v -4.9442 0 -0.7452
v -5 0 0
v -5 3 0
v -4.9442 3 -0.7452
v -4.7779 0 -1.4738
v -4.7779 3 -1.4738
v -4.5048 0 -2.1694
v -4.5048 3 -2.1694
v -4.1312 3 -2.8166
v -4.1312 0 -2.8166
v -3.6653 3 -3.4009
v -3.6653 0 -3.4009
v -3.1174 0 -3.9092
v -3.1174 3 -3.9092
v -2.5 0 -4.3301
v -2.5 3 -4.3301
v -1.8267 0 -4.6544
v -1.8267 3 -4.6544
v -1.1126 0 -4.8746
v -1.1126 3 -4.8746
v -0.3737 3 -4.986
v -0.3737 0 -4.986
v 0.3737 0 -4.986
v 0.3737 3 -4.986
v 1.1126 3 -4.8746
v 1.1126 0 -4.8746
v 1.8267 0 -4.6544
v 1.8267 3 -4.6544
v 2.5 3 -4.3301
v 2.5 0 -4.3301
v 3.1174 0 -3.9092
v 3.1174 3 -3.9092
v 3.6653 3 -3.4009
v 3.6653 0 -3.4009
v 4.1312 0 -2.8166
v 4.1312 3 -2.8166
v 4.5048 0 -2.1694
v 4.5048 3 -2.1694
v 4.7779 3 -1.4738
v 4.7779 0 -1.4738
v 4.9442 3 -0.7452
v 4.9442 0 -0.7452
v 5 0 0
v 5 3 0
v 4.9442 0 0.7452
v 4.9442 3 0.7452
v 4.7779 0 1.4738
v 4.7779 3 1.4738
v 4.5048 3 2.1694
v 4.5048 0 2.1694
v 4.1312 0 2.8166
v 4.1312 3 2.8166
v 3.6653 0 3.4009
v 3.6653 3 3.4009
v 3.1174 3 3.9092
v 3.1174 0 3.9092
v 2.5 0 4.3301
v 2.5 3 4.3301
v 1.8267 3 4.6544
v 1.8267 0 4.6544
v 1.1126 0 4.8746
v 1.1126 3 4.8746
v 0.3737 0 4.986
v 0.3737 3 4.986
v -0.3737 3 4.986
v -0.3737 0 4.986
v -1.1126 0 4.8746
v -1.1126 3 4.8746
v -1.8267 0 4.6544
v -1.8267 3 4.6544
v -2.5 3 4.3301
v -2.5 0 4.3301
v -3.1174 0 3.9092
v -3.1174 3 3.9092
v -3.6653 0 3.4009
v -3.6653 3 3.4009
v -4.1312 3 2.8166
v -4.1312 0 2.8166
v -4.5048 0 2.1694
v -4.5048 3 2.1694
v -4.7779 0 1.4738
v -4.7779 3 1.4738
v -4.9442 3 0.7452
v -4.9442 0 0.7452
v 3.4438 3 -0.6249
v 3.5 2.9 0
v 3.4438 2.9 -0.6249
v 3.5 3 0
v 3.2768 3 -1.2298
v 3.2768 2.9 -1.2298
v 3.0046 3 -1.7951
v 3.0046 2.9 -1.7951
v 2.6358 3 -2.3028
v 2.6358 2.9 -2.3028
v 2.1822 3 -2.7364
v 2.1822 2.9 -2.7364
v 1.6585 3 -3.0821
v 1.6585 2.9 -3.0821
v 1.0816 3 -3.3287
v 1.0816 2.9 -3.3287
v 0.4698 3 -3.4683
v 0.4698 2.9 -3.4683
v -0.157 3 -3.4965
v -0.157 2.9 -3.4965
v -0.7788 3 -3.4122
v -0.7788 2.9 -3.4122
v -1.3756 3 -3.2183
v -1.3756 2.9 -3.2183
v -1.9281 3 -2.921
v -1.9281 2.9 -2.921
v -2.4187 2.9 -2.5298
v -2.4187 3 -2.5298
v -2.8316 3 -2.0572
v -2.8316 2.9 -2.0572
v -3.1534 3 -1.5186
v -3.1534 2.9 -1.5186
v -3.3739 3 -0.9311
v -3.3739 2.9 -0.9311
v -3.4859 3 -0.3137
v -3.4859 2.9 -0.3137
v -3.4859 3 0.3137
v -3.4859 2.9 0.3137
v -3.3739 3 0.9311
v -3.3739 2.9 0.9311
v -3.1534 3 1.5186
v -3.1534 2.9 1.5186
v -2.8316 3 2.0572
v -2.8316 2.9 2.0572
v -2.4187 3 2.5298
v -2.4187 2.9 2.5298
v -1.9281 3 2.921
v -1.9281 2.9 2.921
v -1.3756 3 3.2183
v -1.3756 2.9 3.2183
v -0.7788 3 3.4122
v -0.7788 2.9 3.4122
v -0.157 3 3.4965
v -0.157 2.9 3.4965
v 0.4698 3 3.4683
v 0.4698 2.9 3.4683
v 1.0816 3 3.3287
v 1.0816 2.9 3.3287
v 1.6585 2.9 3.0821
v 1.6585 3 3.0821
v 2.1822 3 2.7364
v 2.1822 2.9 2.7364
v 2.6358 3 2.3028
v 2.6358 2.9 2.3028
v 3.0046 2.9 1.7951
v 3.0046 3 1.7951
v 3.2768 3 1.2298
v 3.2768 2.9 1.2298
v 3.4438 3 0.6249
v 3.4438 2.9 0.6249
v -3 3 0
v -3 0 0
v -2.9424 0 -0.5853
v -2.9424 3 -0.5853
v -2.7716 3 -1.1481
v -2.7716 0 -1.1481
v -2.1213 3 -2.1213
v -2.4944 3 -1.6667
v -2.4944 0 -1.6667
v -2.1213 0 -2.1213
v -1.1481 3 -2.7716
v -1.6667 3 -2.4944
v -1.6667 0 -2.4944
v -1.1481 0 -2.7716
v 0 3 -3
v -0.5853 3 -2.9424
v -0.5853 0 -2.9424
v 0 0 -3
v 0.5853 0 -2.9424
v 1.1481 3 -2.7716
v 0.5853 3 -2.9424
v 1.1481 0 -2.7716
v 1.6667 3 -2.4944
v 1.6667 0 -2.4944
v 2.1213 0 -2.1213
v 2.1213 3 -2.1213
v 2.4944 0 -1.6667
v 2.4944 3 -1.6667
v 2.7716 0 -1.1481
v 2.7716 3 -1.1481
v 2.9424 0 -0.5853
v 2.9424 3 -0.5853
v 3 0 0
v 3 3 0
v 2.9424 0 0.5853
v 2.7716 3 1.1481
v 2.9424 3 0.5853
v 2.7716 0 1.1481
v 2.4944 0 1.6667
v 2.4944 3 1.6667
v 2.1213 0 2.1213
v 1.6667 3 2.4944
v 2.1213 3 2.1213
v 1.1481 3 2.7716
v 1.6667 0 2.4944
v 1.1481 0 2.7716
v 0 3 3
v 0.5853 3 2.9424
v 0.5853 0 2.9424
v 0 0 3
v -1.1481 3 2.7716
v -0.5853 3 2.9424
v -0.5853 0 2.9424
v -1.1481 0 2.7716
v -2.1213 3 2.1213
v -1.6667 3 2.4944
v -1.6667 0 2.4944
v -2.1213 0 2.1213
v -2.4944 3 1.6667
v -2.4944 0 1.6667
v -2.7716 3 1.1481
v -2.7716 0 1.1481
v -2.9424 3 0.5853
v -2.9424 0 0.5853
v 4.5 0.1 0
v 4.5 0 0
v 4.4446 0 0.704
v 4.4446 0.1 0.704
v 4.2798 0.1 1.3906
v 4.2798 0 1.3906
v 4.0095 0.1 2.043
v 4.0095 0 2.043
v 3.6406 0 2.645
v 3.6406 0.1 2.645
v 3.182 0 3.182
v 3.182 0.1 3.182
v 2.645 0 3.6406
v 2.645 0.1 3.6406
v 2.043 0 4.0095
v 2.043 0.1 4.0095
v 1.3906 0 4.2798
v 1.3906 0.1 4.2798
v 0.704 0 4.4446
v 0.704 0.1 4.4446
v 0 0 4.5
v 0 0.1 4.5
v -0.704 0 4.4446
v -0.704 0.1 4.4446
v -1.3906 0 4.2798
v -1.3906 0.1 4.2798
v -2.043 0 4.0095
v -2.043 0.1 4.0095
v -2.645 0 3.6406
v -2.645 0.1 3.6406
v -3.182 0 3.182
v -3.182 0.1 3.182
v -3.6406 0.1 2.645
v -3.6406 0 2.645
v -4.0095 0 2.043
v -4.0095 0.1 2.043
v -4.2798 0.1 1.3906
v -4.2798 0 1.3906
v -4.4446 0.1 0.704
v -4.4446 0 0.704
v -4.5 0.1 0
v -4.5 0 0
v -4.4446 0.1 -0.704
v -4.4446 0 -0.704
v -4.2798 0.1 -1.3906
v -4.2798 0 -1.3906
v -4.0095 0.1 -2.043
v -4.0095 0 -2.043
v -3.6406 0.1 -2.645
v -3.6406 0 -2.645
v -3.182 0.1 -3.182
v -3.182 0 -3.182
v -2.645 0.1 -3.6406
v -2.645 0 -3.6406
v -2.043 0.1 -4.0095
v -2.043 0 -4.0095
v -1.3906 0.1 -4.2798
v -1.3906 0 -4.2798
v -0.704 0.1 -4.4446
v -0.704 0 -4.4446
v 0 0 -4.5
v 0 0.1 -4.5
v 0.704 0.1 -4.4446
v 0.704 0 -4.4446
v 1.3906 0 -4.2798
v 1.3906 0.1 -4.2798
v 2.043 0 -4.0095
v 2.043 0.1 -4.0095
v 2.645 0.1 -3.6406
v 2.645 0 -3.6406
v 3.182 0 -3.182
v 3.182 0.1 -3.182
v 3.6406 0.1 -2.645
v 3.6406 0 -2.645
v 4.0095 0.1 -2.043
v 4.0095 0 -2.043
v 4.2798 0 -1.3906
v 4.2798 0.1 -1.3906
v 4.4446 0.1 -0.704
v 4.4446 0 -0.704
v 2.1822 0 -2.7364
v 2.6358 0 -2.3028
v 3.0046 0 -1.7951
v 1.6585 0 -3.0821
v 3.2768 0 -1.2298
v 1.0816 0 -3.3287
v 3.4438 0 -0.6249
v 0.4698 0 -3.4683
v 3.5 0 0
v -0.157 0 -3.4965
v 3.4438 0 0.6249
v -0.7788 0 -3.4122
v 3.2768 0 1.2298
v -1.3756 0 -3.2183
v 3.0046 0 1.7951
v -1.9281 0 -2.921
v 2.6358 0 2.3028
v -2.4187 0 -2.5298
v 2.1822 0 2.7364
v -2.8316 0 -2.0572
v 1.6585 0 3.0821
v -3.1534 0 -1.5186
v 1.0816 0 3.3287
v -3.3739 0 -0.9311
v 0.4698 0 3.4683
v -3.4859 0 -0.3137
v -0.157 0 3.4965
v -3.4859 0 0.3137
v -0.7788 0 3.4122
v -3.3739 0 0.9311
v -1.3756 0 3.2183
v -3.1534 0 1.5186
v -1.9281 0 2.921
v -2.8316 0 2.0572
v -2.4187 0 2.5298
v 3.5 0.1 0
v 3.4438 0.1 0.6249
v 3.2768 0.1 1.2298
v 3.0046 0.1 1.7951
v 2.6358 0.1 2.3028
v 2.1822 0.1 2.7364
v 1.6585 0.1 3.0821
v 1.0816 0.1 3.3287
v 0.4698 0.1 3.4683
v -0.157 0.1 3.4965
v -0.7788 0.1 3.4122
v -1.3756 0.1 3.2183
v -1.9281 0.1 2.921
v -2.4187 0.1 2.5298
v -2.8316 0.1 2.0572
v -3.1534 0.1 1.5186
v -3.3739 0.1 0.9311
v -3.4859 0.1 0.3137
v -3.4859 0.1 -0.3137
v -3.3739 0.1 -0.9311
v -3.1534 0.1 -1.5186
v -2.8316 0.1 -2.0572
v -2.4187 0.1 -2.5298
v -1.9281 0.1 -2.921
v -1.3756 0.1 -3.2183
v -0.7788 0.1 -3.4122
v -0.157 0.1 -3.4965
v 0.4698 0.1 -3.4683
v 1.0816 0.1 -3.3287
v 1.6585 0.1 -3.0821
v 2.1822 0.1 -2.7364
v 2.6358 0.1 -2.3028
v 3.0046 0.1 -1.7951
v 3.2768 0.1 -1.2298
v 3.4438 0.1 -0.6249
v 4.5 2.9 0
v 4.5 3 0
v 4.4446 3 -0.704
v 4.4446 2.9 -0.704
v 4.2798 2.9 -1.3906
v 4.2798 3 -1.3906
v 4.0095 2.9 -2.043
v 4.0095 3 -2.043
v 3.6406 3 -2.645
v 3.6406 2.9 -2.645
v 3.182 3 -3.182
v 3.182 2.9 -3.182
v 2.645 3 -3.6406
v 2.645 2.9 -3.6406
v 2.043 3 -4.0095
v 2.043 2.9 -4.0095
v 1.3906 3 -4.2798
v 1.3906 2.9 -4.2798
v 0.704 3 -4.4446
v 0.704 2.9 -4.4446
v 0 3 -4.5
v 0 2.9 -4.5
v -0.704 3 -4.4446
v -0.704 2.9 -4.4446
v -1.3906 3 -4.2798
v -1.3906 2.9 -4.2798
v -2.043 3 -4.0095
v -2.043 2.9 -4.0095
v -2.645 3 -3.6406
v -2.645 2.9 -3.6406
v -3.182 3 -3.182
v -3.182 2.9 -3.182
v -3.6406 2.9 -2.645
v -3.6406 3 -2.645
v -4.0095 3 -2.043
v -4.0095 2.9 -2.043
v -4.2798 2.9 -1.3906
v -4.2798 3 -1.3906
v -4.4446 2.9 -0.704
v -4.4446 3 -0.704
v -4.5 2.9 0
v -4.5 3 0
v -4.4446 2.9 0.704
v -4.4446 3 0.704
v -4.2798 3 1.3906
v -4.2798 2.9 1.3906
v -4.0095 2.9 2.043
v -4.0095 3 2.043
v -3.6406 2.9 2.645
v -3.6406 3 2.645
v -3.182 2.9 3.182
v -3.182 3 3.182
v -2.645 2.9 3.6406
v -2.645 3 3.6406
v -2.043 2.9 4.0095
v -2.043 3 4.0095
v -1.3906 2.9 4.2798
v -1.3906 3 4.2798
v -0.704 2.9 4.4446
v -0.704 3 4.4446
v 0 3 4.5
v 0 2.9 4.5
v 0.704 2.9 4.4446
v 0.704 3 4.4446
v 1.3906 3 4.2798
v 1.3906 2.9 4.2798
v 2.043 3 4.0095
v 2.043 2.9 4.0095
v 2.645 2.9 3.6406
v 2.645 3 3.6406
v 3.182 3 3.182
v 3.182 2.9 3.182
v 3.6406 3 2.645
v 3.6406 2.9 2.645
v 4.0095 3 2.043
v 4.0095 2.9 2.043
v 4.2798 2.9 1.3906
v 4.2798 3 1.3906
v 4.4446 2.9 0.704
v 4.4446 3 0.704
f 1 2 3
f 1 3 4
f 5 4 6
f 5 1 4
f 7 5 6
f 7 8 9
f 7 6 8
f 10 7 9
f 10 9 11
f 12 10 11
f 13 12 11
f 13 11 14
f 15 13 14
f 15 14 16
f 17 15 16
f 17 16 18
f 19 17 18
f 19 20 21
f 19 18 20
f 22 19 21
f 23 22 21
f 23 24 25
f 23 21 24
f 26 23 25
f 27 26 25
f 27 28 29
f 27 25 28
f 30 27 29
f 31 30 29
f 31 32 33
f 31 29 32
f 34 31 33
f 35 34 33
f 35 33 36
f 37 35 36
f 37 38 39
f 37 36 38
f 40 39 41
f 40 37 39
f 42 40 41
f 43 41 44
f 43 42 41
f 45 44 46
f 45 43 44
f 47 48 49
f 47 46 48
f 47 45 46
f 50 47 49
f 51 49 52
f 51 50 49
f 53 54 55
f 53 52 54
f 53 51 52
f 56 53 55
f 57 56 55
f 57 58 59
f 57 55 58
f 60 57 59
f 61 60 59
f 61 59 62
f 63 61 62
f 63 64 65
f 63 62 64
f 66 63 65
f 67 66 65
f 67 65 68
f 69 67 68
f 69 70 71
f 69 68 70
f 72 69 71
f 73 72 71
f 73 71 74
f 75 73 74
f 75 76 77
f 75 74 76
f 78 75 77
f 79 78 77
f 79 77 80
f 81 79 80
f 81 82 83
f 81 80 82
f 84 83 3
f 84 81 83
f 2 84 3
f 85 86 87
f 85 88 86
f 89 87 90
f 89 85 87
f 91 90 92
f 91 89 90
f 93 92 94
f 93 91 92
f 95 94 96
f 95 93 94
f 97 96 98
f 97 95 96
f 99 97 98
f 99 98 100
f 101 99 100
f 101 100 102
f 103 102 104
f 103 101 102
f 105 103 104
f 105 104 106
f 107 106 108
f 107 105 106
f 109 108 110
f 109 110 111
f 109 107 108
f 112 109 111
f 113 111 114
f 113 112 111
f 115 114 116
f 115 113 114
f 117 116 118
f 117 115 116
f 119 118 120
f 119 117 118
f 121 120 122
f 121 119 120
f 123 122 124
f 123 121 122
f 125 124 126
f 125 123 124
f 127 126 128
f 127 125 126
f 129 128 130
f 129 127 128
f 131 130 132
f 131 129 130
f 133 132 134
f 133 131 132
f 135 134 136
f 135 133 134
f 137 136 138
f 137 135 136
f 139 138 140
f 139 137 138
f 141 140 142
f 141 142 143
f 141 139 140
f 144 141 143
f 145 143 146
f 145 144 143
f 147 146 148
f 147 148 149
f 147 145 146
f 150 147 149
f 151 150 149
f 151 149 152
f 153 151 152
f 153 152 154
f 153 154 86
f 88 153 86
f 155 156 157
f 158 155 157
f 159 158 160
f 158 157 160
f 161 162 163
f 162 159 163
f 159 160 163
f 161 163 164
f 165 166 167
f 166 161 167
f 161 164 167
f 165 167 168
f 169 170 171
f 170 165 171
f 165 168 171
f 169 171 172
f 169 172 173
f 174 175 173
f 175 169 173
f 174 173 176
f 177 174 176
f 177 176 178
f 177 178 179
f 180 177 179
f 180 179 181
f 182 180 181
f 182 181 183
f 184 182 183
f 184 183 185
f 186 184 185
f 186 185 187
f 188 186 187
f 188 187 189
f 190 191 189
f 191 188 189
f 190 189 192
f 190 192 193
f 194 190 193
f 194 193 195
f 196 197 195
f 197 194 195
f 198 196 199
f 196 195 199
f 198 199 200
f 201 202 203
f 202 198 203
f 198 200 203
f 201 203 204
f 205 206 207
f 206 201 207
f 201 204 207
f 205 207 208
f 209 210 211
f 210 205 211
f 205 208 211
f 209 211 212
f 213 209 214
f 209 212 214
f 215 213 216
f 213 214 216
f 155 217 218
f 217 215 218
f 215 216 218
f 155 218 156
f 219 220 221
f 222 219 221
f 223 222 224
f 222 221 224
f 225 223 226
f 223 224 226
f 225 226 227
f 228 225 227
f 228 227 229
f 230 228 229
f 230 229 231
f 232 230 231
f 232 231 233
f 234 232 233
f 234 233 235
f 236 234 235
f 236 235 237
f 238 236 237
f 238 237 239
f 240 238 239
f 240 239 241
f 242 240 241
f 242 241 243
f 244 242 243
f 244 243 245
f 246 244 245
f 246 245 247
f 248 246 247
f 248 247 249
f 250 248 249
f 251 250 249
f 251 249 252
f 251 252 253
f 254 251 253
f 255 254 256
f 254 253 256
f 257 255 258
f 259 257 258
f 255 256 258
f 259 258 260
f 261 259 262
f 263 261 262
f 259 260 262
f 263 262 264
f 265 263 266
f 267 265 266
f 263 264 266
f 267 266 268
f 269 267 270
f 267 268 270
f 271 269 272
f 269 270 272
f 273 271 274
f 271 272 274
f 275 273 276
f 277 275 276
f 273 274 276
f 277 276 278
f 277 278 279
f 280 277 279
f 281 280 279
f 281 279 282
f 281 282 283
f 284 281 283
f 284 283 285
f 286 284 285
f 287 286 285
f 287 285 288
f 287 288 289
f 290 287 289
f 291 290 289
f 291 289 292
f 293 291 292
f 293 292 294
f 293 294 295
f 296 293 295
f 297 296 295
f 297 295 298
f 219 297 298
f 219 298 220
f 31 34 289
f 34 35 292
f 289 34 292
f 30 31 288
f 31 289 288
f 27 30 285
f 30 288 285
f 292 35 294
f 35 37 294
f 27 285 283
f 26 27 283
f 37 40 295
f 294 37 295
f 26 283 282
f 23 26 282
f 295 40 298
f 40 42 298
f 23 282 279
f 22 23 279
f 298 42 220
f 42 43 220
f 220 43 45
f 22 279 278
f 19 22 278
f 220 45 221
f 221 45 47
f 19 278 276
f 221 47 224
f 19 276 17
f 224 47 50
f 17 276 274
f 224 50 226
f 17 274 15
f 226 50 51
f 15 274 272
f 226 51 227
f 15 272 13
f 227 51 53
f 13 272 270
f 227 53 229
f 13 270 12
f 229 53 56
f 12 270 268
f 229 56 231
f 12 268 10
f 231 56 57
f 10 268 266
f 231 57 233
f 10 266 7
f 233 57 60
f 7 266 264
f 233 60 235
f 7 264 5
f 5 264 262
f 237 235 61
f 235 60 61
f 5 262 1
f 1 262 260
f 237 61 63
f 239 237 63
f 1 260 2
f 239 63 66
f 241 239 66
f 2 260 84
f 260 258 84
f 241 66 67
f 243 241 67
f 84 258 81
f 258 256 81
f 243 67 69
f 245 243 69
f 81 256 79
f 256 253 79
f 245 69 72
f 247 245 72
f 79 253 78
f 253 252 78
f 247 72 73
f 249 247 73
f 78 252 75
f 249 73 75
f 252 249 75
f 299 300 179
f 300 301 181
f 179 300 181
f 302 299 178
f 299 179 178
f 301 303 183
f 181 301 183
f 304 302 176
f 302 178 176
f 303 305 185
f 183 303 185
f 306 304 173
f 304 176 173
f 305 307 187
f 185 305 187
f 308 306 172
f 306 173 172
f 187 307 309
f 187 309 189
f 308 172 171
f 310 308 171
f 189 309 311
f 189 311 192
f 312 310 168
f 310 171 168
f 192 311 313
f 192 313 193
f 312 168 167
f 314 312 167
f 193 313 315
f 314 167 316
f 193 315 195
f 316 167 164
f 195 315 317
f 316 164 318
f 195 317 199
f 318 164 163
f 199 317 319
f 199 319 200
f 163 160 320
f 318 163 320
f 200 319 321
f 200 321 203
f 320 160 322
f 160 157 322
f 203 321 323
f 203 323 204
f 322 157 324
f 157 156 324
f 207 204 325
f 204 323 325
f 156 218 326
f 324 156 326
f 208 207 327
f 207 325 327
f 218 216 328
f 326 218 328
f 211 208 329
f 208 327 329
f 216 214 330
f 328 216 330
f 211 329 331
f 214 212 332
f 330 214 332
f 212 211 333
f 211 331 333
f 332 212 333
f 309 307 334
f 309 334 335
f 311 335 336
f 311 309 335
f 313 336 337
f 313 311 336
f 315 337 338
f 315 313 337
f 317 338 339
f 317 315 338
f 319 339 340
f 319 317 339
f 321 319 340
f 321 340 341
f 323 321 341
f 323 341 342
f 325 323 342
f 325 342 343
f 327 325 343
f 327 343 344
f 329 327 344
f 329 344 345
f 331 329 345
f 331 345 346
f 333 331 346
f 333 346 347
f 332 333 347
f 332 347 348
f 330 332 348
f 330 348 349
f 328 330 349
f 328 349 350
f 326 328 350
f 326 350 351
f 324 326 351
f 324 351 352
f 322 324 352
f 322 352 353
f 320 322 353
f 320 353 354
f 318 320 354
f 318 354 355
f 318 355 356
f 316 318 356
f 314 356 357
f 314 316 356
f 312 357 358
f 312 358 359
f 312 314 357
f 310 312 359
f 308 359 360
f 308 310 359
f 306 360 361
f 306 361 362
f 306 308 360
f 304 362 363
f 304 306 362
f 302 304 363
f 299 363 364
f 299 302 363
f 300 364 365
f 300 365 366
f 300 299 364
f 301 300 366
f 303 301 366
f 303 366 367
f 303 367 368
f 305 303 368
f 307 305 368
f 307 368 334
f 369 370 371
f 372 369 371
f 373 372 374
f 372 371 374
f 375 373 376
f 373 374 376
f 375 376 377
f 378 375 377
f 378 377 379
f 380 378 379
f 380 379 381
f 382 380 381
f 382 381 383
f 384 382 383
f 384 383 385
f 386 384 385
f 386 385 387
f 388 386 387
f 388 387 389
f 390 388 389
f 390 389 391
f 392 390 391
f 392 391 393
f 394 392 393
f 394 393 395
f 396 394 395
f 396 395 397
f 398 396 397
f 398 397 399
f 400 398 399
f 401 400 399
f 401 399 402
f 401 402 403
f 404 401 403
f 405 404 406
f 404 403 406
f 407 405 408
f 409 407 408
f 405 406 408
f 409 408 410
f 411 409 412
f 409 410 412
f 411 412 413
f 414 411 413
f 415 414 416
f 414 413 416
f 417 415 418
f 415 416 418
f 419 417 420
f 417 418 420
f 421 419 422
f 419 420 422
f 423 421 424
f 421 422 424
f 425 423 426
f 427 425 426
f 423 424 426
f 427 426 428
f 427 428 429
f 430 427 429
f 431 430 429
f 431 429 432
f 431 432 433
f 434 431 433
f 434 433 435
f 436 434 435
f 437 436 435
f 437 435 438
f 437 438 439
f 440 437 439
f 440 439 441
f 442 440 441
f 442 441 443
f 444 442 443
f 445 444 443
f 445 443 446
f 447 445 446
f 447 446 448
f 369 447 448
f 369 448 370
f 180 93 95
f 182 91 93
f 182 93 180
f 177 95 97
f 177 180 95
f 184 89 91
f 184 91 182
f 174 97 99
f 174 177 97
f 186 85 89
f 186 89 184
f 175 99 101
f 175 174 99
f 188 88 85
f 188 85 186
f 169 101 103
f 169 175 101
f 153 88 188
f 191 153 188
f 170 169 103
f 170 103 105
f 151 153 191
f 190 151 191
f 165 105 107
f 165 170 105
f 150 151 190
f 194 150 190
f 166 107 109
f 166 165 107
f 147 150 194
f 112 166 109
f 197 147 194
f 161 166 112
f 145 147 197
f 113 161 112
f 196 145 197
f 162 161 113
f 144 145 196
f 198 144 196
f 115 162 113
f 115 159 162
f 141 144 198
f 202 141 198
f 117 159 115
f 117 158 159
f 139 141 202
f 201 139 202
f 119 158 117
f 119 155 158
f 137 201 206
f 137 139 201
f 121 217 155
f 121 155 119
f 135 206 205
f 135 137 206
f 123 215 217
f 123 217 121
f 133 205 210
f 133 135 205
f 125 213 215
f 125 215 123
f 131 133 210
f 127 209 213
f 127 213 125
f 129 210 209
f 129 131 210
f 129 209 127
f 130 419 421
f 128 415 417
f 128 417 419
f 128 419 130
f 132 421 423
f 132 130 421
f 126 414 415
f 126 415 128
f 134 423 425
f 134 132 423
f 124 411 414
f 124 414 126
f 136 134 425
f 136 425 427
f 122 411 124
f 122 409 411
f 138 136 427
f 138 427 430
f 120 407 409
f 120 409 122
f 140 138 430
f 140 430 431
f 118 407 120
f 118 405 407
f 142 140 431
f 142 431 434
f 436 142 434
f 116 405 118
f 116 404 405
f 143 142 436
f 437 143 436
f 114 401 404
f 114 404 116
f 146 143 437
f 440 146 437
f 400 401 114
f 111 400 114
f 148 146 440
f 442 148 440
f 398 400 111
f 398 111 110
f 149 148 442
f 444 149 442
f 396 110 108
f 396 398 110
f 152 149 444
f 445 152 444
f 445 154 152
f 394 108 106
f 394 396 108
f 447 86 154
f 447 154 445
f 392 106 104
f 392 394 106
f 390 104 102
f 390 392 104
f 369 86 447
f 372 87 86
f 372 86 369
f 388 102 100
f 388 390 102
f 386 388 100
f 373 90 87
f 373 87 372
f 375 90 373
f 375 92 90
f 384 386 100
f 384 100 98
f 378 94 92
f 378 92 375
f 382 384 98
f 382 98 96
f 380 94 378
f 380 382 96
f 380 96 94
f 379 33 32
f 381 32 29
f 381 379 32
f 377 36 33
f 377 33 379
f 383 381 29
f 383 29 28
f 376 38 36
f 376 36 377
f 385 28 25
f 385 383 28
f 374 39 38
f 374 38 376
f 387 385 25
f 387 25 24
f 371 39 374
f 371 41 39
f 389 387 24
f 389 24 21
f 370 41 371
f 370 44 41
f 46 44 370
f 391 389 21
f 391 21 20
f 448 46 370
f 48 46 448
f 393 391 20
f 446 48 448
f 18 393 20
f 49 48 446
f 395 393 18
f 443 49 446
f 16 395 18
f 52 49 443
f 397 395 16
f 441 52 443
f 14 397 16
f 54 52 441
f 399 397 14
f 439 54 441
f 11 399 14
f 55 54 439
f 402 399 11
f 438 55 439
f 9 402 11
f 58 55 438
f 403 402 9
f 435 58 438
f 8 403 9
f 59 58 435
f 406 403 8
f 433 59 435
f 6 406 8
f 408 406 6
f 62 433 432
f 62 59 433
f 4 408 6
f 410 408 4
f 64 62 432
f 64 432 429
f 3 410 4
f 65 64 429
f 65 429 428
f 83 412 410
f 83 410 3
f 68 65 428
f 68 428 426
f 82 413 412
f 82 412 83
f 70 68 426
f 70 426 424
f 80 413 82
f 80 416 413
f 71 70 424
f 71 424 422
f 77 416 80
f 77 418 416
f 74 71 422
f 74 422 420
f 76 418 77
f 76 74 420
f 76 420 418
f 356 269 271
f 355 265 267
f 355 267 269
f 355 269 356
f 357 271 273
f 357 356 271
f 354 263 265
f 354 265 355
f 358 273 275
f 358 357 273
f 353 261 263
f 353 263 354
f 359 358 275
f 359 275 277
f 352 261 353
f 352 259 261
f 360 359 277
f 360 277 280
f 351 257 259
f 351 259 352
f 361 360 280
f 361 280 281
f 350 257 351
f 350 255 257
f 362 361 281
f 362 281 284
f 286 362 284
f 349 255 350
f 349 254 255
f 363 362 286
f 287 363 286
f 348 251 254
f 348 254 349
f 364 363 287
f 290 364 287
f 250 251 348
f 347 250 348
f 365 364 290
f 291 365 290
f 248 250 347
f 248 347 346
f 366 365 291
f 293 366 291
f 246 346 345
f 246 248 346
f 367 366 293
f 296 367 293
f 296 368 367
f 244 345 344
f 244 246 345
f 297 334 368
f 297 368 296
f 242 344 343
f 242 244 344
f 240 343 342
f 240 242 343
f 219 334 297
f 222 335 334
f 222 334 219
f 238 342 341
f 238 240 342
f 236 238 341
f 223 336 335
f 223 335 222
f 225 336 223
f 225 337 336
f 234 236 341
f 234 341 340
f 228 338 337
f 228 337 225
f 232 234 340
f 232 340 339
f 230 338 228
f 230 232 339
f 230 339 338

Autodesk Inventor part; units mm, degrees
ref_plane "YZ Plane" through (0, 0, 0) normal (1, 0, 0) x (0, 1, 0)
ref_plane "XZ Plane" through (0, 0, 0) normal (0, 1, 0) x (-1, 0, 0)
ref_plane "XY Plane" through (0, 0, 0) normal (0, 0, 1) x (1, 0, 0)
sketch "Sketch1" plane through (0, 0, 0) normal (0, 1, 0) x (-1, 0, 0)
  circle A0 centre (0, 0) radius 3
  circle A1 centre (0, 0) radius 5
  dimension "d0" = 6
  dimension "d1" = 10
extrude "Extrusion1" add sketch "Sketch1" along normal blind 3
sketch "Sketch2" plane through (0, 3, 0) normal (0, 1, 0) x (1, 0, 0)
  circle A0 centre (0, 0) radius 5 projected
  circle A1 centre (0, 0) radius 3 projected
  circle A2 centre (0, 0) radius 3.5
  circle A3 centre (0, 0) radius 4.5
  dimension "d4" = 7
  dimension "d5" = 9
extrude "Extrusion2" cut sketch "Sketch2" against normal blind 0.1 contours A3
sketch "Sketch3" plane through (0, 0, 0) normal (0, -1, 0) x (1, 0, 0)
  circle A0 centre (0, 0) radius 3.5 projected
  circle A1 centre (0, 0) radius 4.5 projected
extrude "Extrusion3" cut sketch "Sketch3" against normal blind 0.1
properties part number "bearing_6_10_3"
